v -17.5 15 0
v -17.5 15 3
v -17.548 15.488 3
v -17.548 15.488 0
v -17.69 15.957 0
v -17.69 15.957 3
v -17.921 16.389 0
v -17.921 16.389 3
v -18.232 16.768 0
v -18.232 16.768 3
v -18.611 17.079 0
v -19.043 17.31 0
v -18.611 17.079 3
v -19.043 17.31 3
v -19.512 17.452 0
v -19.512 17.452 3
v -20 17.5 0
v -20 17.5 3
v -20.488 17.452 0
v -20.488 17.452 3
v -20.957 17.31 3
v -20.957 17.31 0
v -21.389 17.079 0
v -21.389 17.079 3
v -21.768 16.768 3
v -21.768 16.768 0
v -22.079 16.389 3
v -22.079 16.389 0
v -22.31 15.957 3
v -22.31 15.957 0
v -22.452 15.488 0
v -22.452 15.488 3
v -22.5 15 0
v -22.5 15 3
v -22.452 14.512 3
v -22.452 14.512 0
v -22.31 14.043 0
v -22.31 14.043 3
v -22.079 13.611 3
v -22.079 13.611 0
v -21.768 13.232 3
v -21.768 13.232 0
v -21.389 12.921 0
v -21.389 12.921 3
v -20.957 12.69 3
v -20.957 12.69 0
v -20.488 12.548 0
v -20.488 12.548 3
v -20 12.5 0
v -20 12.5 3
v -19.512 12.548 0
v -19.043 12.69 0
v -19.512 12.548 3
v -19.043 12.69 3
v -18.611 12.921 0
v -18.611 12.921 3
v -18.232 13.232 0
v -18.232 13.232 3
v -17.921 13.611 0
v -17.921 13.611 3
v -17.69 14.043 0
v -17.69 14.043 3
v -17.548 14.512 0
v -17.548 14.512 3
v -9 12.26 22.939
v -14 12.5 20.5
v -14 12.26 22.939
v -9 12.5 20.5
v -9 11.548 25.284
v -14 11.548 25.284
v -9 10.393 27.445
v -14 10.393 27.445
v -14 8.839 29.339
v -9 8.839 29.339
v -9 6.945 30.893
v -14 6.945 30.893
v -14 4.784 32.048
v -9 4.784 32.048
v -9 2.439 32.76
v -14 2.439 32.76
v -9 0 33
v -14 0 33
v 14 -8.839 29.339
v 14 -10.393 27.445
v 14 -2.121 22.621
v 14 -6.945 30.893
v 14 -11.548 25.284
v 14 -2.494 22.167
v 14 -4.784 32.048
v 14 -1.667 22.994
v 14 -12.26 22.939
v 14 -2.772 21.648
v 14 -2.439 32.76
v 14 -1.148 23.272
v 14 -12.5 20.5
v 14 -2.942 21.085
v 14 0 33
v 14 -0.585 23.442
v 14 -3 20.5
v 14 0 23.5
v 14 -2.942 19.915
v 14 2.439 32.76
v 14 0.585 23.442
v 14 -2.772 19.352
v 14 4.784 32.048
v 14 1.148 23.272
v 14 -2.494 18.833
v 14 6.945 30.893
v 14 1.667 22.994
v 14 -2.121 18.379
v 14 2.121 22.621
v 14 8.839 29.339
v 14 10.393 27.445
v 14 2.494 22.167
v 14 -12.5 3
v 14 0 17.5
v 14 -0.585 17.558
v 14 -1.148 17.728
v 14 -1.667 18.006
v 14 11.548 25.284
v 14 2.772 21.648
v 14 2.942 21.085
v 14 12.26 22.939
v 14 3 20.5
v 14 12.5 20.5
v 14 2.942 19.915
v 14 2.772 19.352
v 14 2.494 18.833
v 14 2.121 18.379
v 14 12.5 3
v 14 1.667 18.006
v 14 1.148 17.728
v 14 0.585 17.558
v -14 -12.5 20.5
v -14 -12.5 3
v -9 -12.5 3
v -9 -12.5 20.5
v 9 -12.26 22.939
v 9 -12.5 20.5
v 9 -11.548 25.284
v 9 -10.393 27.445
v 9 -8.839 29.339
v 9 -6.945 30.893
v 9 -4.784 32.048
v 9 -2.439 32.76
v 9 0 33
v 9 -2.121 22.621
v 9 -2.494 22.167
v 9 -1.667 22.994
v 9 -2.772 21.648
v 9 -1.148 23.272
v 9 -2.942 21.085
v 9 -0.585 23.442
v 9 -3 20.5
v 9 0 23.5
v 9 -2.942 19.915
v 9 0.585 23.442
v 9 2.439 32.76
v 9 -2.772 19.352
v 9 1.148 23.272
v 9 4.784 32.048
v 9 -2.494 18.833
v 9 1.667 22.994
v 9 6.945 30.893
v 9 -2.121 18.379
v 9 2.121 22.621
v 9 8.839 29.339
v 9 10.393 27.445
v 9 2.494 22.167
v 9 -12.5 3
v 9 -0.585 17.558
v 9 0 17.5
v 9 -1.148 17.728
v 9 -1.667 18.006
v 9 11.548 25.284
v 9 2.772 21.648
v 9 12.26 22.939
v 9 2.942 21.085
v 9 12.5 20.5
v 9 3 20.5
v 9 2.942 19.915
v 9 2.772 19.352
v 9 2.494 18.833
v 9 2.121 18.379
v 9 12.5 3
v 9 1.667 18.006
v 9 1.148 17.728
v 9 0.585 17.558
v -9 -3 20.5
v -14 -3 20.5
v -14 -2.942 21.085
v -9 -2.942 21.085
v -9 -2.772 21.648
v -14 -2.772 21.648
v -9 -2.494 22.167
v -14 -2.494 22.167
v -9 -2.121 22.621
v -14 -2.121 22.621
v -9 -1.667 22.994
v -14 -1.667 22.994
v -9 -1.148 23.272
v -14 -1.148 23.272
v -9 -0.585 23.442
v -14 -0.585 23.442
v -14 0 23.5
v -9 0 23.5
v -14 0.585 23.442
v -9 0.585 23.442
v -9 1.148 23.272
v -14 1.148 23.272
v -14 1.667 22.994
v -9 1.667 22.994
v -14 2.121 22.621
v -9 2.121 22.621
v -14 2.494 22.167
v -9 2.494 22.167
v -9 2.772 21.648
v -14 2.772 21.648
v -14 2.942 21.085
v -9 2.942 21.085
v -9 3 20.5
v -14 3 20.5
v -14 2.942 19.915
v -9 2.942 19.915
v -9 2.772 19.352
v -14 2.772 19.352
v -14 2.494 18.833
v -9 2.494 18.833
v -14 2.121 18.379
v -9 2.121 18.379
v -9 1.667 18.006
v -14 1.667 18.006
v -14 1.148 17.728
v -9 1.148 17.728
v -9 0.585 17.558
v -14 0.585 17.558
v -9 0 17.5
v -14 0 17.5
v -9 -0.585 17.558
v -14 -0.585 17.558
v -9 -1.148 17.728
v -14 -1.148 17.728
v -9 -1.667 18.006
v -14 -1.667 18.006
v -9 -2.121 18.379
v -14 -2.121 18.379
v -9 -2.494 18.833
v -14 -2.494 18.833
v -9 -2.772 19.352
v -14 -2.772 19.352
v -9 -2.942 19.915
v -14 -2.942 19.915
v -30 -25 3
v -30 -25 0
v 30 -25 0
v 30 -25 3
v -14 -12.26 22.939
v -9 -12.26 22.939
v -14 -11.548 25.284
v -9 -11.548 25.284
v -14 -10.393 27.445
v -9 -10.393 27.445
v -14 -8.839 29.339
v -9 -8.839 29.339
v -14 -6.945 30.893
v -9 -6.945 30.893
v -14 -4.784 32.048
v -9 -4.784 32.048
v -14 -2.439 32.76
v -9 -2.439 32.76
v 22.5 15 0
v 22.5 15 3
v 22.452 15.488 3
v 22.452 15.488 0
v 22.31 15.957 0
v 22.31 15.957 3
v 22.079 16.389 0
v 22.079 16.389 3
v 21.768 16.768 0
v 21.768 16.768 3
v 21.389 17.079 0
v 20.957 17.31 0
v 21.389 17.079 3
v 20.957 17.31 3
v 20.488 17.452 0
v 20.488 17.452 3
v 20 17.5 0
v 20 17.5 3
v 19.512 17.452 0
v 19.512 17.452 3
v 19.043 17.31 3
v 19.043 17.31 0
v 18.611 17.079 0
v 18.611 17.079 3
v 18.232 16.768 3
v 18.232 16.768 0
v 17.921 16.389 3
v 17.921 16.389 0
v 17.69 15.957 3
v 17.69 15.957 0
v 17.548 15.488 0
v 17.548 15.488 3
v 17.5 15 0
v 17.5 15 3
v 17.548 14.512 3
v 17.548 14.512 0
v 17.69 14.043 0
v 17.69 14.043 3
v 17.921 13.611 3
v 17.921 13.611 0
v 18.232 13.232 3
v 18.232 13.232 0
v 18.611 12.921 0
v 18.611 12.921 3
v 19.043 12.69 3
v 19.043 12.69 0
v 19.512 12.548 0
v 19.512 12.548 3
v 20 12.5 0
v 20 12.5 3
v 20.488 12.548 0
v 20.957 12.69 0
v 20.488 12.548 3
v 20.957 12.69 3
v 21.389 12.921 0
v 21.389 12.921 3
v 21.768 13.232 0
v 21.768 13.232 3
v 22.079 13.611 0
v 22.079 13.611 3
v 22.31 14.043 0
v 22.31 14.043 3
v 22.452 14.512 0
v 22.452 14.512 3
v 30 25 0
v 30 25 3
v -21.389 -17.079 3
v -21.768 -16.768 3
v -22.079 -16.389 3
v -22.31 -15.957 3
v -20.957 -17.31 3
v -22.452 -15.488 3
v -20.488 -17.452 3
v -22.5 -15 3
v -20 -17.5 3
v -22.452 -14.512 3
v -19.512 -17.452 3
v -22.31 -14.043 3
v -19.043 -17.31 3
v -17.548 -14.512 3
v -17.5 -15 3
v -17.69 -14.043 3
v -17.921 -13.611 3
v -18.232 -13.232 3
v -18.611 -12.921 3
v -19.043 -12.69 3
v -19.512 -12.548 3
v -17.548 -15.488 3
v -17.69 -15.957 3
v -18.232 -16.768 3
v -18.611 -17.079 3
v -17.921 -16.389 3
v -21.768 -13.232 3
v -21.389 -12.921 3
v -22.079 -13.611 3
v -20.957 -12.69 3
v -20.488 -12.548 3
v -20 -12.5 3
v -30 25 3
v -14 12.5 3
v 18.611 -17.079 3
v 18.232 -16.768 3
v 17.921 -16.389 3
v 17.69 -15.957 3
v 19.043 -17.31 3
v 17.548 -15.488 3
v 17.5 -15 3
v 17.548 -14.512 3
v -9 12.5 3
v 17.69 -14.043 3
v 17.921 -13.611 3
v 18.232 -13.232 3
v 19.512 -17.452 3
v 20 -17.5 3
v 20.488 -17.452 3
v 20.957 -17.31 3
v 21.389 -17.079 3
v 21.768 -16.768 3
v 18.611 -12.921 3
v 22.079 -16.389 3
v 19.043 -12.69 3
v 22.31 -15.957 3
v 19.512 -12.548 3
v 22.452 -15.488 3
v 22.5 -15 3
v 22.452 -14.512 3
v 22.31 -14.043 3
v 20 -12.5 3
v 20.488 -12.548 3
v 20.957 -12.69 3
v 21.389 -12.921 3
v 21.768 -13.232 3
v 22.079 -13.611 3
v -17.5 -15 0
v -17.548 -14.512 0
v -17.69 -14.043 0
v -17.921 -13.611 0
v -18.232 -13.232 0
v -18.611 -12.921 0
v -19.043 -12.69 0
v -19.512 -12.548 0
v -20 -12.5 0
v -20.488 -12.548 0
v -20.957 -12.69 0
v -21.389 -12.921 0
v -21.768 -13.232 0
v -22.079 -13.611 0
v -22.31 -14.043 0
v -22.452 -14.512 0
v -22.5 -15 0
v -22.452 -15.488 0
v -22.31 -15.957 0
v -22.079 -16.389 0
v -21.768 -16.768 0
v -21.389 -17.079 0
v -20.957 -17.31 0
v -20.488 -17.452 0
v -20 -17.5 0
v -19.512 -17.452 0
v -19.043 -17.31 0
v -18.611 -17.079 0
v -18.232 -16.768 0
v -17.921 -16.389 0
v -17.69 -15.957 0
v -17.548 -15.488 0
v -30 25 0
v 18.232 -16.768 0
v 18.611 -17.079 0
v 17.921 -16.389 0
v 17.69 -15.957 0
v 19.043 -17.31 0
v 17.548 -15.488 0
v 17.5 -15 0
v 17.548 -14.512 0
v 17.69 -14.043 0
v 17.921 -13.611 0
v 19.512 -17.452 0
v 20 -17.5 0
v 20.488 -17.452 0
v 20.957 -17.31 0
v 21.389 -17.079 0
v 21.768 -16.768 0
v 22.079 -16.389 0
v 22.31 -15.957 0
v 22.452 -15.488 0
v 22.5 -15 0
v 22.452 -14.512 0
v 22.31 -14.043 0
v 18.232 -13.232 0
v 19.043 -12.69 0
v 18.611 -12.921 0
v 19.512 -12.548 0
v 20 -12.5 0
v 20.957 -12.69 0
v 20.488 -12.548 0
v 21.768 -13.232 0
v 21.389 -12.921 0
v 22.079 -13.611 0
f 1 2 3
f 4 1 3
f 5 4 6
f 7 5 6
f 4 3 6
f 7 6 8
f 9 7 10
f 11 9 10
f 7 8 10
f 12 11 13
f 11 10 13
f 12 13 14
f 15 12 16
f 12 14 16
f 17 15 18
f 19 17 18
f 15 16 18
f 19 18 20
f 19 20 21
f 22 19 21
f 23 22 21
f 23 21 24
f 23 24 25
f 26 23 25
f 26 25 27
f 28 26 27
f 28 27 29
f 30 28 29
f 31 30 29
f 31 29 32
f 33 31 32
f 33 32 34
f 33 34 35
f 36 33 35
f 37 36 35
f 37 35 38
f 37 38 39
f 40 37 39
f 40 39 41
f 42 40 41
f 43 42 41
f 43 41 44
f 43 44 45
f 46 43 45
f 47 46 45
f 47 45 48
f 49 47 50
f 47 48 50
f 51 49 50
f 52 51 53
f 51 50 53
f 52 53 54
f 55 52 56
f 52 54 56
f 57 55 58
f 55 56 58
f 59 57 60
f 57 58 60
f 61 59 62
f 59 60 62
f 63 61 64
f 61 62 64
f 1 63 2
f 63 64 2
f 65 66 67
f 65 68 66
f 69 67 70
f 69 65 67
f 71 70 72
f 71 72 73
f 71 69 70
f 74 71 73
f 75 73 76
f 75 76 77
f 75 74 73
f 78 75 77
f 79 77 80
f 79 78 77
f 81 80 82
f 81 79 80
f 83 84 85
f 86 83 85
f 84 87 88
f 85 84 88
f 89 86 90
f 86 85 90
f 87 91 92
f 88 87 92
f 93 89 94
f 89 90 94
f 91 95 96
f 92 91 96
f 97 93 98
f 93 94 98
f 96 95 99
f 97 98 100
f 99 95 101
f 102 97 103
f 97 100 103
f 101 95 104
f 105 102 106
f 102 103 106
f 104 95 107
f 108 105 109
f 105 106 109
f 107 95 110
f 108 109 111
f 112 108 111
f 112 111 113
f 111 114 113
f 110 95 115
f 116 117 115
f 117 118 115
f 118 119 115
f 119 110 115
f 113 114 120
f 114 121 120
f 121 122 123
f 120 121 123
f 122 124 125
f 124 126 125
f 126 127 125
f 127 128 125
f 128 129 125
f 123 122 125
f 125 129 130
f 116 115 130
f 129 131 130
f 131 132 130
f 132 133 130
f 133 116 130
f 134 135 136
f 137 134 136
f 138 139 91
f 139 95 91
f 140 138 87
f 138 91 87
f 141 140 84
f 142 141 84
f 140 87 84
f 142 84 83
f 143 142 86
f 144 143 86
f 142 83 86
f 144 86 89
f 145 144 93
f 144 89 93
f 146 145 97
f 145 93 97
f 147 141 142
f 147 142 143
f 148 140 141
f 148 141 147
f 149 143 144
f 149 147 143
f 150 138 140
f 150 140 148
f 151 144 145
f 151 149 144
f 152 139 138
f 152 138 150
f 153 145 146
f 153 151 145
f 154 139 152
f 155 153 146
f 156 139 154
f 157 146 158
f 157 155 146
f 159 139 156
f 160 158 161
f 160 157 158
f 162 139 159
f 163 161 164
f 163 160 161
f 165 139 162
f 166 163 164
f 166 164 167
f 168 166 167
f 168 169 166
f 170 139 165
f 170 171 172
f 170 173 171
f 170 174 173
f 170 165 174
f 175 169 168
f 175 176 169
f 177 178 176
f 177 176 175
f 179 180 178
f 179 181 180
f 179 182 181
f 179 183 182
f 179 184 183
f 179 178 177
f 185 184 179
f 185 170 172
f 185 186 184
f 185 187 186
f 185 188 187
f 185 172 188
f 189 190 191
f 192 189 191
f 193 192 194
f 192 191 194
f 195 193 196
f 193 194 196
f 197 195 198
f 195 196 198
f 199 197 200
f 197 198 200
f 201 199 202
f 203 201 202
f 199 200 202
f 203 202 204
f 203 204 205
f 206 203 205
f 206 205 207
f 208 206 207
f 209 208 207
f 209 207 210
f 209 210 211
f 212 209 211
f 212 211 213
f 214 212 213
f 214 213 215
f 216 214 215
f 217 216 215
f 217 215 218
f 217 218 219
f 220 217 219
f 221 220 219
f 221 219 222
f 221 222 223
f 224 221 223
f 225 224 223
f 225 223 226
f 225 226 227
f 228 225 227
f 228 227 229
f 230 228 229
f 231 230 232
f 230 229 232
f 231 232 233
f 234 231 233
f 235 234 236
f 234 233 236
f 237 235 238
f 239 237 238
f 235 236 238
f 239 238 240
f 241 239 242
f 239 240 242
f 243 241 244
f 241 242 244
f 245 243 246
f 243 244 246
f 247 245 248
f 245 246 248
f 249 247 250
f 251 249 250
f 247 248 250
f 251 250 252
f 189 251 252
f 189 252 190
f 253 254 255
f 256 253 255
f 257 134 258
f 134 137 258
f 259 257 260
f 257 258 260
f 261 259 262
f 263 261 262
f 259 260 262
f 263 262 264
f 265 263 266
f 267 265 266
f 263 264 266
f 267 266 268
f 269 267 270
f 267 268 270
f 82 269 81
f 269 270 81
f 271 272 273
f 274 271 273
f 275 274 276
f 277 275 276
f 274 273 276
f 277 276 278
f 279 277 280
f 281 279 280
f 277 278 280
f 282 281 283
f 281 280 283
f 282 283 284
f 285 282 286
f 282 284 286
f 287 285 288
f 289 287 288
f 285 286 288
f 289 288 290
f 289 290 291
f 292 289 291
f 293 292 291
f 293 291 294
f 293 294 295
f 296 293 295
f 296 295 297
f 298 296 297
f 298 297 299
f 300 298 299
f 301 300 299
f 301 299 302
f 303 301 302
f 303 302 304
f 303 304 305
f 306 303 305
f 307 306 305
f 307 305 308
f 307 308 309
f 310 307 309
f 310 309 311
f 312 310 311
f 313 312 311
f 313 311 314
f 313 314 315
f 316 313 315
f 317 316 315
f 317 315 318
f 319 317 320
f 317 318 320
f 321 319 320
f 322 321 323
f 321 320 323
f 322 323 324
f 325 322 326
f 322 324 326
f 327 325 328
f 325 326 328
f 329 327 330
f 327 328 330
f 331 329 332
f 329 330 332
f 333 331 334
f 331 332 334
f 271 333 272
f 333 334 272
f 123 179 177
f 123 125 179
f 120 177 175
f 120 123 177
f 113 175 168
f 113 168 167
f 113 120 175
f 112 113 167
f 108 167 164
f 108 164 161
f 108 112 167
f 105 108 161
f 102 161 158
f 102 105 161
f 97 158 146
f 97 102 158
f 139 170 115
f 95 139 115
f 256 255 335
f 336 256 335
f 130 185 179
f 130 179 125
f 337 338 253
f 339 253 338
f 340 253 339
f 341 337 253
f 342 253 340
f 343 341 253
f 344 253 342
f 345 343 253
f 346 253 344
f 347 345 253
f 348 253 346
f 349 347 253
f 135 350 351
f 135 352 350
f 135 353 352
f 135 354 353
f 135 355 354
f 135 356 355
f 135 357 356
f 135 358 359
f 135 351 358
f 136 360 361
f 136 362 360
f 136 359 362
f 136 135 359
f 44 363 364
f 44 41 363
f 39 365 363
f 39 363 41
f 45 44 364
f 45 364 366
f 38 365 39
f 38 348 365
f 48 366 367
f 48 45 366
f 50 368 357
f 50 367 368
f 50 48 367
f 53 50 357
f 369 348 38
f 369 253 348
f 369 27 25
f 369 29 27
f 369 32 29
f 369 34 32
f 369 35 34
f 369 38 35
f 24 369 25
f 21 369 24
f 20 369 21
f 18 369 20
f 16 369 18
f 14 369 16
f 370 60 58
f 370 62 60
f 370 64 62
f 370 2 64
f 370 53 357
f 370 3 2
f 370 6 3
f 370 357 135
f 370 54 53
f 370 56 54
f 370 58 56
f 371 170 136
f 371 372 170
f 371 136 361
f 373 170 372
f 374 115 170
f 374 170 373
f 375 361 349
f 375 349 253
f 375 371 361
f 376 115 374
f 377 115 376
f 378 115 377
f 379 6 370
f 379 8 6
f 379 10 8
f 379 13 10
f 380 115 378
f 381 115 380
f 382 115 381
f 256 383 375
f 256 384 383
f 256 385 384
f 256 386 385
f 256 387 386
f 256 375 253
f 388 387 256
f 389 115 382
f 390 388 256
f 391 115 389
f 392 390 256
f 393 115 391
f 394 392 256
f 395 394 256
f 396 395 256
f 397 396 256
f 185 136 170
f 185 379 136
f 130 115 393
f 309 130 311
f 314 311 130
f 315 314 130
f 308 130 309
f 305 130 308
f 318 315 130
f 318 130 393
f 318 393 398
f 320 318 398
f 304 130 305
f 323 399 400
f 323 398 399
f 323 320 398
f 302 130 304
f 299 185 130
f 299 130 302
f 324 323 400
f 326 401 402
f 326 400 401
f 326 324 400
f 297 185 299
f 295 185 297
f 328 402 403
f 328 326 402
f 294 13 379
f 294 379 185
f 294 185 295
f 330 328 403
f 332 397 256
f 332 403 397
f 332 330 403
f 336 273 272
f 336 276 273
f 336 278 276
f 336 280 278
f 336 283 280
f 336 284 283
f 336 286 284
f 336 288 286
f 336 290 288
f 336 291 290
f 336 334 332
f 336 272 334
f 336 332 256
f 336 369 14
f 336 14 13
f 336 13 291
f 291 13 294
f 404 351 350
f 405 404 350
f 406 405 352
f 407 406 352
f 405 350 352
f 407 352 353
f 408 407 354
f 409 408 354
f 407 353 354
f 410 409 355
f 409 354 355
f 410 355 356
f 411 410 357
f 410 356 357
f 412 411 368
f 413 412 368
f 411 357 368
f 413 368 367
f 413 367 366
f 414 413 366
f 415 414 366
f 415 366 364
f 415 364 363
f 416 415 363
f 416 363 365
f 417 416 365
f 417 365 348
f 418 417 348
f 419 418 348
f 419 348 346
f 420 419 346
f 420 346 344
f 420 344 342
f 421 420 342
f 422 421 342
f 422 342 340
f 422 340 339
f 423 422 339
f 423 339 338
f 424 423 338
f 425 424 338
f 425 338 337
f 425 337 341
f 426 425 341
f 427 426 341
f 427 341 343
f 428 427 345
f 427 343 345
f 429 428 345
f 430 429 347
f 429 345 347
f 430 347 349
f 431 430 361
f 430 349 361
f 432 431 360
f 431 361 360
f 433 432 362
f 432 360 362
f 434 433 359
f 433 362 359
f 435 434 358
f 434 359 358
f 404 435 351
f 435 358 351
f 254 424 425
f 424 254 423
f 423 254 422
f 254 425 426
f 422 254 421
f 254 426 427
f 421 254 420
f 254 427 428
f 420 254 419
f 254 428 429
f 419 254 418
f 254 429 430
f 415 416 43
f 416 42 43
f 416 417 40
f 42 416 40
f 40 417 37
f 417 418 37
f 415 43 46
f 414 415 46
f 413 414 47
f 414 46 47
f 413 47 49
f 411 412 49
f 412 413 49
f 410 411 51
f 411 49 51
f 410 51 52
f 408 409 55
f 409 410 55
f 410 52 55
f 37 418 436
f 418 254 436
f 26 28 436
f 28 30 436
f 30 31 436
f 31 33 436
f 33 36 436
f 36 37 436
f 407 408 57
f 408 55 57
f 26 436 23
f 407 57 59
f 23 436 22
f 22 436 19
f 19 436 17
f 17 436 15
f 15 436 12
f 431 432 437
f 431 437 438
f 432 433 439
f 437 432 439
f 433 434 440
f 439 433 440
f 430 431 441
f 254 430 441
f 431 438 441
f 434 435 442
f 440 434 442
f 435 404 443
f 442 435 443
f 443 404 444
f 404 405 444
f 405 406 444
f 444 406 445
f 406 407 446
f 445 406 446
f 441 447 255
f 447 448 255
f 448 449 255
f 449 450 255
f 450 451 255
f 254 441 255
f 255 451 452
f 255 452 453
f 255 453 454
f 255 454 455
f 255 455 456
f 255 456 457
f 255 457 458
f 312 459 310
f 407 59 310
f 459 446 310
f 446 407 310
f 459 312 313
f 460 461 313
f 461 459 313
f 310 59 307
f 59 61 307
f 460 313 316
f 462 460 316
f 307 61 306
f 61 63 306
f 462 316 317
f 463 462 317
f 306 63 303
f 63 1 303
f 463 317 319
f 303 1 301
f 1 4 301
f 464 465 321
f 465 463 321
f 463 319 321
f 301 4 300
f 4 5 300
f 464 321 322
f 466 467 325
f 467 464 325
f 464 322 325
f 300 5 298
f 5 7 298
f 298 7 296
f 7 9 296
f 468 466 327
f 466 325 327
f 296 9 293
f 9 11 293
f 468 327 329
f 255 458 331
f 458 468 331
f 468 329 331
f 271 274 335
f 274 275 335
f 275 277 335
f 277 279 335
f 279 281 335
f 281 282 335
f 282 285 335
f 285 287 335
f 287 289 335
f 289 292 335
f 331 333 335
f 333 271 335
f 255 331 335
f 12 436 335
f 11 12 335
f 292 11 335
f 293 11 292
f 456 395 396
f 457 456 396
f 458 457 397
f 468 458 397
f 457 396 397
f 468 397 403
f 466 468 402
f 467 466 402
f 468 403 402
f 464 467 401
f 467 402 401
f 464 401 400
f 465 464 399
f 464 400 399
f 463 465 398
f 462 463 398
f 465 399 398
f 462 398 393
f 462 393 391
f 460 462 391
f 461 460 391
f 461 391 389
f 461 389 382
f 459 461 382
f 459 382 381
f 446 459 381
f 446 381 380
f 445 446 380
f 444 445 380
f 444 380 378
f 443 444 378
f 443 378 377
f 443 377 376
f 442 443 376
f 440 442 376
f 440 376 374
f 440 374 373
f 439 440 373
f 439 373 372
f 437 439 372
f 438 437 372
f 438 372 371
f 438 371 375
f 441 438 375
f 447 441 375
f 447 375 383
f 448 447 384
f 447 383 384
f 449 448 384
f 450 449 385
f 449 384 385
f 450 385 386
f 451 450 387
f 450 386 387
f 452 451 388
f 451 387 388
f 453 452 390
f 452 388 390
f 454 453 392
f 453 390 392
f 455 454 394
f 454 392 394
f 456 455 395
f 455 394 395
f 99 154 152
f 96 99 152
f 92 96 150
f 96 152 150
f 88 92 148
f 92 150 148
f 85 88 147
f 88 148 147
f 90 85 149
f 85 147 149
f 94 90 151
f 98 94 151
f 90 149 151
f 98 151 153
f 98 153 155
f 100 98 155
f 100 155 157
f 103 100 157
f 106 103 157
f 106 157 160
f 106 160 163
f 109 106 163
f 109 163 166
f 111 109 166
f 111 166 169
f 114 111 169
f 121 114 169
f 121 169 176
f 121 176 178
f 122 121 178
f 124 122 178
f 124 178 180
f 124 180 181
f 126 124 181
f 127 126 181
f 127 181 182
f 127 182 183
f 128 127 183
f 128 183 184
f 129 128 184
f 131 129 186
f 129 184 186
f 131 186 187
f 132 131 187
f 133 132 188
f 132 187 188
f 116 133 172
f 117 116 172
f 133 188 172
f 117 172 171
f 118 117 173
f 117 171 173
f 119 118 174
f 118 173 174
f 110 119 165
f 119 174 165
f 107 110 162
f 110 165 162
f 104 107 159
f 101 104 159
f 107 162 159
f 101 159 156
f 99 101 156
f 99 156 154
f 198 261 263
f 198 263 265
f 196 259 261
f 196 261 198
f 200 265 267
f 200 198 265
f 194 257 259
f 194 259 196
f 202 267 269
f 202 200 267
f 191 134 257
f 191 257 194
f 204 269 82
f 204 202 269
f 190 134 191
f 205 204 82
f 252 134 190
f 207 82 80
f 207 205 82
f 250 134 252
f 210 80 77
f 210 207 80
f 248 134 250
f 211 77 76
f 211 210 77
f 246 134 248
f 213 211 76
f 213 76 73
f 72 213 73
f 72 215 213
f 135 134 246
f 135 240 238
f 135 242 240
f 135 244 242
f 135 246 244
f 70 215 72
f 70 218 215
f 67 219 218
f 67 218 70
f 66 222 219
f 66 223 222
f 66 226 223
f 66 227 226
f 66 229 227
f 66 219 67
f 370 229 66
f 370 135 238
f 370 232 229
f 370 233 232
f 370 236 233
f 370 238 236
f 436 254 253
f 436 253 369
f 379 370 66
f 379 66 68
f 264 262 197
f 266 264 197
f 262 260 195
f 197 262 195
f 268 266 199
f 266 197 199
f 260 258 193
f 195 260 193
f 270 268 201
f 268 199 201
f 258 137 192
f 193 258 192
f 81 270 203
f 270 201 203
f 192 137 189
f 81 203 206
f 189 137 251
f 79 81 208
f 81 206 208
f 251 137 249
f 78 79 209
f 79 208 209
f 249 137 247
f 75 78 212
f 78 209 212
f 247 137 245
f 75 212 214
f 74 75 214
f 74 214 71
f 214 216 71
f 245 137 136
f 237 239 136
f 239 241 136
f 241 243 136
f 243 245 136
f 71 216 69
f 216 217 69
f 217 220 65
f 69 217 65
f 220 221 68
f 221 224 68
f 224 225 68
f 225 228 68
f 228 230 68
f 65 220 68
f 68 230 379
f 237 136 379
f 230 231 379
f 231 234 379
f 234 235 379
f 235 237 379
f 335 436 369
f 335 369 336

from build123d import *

# Parameters (mm, degrees)
F0_W     = 60
F0_H     = 50
F1_DEPTH = 3
F2_W     = 5
F2_H     = 25
F3_DEPTH = 30
F4_R     = 12.49999
F5_R     = 3
F6_DEPTH = 50
F7_R     = 2.5
F8_DEPTH = 25


# Not quite as in the source:
# - a fillet or chamfer is up to 0.001 mm smaller than in the source, because OpenCascade refuses the exact size


with BuildPart() as f1:
    # F0 (on Top) → F1 (new body)
    with BuildSketch(Plane.XY):
        Rectangle(F0_W, F0_H)
    extrude(amount=F1_DEPTH)

    # F2 (on face) → F3 (join)
    with BuildSketch(Plane.XY.offset(3)):
        with Locations((-11.5, 0)):
            Rectangle(F2_W, F2_H)
        with Locations((11.5, 0)):
            Rectangle(F2_W, F2_H)
    extrude(amount=F3_DEPTH)

    # F4 (radius 12.5 in the source; OpenCascade refuses exactly that, so slightly less here)
    f4_edges = [f1.edges().sort_by_distance(p)[0] for p in [
        (-11.5, -12.5, 33),
        (-11.5, 12.5, 33),
        (11.5, 12.5, 33),
        (11.5, -12.5, 33),
    ]]
    fillet(f4_edges, radius=F4_R)

    # F5 (on face) → F6 (cut)
    with BuildSketch(Plane(origin=(-14, 0, 0), x_dir=(0, -1, 0), z_dir=(-1, 0, 0))):
        with Locations((0, 20.5)):
            Circle(F5_R)
    extrude(amount=-F6_DEPTH, mode=Mode.SUBTRACT)

    # F7 (on face) → F8 (cut)
    with BuildSketch(Plane.XY.offset(3)):
        with Locations((-20, -15)):
            Circle(F7_R)
        with Locations((-20, 15)):
            Circle(F7_R)
        with Locations((20, 15)):
            Circle(F7_R)
        with Locations((20, -15)):
            Circle(F7_R)
    extrude(amount=-F8_DEPTH, mode=Mode.SUBTRACT)


solid = f1.part
